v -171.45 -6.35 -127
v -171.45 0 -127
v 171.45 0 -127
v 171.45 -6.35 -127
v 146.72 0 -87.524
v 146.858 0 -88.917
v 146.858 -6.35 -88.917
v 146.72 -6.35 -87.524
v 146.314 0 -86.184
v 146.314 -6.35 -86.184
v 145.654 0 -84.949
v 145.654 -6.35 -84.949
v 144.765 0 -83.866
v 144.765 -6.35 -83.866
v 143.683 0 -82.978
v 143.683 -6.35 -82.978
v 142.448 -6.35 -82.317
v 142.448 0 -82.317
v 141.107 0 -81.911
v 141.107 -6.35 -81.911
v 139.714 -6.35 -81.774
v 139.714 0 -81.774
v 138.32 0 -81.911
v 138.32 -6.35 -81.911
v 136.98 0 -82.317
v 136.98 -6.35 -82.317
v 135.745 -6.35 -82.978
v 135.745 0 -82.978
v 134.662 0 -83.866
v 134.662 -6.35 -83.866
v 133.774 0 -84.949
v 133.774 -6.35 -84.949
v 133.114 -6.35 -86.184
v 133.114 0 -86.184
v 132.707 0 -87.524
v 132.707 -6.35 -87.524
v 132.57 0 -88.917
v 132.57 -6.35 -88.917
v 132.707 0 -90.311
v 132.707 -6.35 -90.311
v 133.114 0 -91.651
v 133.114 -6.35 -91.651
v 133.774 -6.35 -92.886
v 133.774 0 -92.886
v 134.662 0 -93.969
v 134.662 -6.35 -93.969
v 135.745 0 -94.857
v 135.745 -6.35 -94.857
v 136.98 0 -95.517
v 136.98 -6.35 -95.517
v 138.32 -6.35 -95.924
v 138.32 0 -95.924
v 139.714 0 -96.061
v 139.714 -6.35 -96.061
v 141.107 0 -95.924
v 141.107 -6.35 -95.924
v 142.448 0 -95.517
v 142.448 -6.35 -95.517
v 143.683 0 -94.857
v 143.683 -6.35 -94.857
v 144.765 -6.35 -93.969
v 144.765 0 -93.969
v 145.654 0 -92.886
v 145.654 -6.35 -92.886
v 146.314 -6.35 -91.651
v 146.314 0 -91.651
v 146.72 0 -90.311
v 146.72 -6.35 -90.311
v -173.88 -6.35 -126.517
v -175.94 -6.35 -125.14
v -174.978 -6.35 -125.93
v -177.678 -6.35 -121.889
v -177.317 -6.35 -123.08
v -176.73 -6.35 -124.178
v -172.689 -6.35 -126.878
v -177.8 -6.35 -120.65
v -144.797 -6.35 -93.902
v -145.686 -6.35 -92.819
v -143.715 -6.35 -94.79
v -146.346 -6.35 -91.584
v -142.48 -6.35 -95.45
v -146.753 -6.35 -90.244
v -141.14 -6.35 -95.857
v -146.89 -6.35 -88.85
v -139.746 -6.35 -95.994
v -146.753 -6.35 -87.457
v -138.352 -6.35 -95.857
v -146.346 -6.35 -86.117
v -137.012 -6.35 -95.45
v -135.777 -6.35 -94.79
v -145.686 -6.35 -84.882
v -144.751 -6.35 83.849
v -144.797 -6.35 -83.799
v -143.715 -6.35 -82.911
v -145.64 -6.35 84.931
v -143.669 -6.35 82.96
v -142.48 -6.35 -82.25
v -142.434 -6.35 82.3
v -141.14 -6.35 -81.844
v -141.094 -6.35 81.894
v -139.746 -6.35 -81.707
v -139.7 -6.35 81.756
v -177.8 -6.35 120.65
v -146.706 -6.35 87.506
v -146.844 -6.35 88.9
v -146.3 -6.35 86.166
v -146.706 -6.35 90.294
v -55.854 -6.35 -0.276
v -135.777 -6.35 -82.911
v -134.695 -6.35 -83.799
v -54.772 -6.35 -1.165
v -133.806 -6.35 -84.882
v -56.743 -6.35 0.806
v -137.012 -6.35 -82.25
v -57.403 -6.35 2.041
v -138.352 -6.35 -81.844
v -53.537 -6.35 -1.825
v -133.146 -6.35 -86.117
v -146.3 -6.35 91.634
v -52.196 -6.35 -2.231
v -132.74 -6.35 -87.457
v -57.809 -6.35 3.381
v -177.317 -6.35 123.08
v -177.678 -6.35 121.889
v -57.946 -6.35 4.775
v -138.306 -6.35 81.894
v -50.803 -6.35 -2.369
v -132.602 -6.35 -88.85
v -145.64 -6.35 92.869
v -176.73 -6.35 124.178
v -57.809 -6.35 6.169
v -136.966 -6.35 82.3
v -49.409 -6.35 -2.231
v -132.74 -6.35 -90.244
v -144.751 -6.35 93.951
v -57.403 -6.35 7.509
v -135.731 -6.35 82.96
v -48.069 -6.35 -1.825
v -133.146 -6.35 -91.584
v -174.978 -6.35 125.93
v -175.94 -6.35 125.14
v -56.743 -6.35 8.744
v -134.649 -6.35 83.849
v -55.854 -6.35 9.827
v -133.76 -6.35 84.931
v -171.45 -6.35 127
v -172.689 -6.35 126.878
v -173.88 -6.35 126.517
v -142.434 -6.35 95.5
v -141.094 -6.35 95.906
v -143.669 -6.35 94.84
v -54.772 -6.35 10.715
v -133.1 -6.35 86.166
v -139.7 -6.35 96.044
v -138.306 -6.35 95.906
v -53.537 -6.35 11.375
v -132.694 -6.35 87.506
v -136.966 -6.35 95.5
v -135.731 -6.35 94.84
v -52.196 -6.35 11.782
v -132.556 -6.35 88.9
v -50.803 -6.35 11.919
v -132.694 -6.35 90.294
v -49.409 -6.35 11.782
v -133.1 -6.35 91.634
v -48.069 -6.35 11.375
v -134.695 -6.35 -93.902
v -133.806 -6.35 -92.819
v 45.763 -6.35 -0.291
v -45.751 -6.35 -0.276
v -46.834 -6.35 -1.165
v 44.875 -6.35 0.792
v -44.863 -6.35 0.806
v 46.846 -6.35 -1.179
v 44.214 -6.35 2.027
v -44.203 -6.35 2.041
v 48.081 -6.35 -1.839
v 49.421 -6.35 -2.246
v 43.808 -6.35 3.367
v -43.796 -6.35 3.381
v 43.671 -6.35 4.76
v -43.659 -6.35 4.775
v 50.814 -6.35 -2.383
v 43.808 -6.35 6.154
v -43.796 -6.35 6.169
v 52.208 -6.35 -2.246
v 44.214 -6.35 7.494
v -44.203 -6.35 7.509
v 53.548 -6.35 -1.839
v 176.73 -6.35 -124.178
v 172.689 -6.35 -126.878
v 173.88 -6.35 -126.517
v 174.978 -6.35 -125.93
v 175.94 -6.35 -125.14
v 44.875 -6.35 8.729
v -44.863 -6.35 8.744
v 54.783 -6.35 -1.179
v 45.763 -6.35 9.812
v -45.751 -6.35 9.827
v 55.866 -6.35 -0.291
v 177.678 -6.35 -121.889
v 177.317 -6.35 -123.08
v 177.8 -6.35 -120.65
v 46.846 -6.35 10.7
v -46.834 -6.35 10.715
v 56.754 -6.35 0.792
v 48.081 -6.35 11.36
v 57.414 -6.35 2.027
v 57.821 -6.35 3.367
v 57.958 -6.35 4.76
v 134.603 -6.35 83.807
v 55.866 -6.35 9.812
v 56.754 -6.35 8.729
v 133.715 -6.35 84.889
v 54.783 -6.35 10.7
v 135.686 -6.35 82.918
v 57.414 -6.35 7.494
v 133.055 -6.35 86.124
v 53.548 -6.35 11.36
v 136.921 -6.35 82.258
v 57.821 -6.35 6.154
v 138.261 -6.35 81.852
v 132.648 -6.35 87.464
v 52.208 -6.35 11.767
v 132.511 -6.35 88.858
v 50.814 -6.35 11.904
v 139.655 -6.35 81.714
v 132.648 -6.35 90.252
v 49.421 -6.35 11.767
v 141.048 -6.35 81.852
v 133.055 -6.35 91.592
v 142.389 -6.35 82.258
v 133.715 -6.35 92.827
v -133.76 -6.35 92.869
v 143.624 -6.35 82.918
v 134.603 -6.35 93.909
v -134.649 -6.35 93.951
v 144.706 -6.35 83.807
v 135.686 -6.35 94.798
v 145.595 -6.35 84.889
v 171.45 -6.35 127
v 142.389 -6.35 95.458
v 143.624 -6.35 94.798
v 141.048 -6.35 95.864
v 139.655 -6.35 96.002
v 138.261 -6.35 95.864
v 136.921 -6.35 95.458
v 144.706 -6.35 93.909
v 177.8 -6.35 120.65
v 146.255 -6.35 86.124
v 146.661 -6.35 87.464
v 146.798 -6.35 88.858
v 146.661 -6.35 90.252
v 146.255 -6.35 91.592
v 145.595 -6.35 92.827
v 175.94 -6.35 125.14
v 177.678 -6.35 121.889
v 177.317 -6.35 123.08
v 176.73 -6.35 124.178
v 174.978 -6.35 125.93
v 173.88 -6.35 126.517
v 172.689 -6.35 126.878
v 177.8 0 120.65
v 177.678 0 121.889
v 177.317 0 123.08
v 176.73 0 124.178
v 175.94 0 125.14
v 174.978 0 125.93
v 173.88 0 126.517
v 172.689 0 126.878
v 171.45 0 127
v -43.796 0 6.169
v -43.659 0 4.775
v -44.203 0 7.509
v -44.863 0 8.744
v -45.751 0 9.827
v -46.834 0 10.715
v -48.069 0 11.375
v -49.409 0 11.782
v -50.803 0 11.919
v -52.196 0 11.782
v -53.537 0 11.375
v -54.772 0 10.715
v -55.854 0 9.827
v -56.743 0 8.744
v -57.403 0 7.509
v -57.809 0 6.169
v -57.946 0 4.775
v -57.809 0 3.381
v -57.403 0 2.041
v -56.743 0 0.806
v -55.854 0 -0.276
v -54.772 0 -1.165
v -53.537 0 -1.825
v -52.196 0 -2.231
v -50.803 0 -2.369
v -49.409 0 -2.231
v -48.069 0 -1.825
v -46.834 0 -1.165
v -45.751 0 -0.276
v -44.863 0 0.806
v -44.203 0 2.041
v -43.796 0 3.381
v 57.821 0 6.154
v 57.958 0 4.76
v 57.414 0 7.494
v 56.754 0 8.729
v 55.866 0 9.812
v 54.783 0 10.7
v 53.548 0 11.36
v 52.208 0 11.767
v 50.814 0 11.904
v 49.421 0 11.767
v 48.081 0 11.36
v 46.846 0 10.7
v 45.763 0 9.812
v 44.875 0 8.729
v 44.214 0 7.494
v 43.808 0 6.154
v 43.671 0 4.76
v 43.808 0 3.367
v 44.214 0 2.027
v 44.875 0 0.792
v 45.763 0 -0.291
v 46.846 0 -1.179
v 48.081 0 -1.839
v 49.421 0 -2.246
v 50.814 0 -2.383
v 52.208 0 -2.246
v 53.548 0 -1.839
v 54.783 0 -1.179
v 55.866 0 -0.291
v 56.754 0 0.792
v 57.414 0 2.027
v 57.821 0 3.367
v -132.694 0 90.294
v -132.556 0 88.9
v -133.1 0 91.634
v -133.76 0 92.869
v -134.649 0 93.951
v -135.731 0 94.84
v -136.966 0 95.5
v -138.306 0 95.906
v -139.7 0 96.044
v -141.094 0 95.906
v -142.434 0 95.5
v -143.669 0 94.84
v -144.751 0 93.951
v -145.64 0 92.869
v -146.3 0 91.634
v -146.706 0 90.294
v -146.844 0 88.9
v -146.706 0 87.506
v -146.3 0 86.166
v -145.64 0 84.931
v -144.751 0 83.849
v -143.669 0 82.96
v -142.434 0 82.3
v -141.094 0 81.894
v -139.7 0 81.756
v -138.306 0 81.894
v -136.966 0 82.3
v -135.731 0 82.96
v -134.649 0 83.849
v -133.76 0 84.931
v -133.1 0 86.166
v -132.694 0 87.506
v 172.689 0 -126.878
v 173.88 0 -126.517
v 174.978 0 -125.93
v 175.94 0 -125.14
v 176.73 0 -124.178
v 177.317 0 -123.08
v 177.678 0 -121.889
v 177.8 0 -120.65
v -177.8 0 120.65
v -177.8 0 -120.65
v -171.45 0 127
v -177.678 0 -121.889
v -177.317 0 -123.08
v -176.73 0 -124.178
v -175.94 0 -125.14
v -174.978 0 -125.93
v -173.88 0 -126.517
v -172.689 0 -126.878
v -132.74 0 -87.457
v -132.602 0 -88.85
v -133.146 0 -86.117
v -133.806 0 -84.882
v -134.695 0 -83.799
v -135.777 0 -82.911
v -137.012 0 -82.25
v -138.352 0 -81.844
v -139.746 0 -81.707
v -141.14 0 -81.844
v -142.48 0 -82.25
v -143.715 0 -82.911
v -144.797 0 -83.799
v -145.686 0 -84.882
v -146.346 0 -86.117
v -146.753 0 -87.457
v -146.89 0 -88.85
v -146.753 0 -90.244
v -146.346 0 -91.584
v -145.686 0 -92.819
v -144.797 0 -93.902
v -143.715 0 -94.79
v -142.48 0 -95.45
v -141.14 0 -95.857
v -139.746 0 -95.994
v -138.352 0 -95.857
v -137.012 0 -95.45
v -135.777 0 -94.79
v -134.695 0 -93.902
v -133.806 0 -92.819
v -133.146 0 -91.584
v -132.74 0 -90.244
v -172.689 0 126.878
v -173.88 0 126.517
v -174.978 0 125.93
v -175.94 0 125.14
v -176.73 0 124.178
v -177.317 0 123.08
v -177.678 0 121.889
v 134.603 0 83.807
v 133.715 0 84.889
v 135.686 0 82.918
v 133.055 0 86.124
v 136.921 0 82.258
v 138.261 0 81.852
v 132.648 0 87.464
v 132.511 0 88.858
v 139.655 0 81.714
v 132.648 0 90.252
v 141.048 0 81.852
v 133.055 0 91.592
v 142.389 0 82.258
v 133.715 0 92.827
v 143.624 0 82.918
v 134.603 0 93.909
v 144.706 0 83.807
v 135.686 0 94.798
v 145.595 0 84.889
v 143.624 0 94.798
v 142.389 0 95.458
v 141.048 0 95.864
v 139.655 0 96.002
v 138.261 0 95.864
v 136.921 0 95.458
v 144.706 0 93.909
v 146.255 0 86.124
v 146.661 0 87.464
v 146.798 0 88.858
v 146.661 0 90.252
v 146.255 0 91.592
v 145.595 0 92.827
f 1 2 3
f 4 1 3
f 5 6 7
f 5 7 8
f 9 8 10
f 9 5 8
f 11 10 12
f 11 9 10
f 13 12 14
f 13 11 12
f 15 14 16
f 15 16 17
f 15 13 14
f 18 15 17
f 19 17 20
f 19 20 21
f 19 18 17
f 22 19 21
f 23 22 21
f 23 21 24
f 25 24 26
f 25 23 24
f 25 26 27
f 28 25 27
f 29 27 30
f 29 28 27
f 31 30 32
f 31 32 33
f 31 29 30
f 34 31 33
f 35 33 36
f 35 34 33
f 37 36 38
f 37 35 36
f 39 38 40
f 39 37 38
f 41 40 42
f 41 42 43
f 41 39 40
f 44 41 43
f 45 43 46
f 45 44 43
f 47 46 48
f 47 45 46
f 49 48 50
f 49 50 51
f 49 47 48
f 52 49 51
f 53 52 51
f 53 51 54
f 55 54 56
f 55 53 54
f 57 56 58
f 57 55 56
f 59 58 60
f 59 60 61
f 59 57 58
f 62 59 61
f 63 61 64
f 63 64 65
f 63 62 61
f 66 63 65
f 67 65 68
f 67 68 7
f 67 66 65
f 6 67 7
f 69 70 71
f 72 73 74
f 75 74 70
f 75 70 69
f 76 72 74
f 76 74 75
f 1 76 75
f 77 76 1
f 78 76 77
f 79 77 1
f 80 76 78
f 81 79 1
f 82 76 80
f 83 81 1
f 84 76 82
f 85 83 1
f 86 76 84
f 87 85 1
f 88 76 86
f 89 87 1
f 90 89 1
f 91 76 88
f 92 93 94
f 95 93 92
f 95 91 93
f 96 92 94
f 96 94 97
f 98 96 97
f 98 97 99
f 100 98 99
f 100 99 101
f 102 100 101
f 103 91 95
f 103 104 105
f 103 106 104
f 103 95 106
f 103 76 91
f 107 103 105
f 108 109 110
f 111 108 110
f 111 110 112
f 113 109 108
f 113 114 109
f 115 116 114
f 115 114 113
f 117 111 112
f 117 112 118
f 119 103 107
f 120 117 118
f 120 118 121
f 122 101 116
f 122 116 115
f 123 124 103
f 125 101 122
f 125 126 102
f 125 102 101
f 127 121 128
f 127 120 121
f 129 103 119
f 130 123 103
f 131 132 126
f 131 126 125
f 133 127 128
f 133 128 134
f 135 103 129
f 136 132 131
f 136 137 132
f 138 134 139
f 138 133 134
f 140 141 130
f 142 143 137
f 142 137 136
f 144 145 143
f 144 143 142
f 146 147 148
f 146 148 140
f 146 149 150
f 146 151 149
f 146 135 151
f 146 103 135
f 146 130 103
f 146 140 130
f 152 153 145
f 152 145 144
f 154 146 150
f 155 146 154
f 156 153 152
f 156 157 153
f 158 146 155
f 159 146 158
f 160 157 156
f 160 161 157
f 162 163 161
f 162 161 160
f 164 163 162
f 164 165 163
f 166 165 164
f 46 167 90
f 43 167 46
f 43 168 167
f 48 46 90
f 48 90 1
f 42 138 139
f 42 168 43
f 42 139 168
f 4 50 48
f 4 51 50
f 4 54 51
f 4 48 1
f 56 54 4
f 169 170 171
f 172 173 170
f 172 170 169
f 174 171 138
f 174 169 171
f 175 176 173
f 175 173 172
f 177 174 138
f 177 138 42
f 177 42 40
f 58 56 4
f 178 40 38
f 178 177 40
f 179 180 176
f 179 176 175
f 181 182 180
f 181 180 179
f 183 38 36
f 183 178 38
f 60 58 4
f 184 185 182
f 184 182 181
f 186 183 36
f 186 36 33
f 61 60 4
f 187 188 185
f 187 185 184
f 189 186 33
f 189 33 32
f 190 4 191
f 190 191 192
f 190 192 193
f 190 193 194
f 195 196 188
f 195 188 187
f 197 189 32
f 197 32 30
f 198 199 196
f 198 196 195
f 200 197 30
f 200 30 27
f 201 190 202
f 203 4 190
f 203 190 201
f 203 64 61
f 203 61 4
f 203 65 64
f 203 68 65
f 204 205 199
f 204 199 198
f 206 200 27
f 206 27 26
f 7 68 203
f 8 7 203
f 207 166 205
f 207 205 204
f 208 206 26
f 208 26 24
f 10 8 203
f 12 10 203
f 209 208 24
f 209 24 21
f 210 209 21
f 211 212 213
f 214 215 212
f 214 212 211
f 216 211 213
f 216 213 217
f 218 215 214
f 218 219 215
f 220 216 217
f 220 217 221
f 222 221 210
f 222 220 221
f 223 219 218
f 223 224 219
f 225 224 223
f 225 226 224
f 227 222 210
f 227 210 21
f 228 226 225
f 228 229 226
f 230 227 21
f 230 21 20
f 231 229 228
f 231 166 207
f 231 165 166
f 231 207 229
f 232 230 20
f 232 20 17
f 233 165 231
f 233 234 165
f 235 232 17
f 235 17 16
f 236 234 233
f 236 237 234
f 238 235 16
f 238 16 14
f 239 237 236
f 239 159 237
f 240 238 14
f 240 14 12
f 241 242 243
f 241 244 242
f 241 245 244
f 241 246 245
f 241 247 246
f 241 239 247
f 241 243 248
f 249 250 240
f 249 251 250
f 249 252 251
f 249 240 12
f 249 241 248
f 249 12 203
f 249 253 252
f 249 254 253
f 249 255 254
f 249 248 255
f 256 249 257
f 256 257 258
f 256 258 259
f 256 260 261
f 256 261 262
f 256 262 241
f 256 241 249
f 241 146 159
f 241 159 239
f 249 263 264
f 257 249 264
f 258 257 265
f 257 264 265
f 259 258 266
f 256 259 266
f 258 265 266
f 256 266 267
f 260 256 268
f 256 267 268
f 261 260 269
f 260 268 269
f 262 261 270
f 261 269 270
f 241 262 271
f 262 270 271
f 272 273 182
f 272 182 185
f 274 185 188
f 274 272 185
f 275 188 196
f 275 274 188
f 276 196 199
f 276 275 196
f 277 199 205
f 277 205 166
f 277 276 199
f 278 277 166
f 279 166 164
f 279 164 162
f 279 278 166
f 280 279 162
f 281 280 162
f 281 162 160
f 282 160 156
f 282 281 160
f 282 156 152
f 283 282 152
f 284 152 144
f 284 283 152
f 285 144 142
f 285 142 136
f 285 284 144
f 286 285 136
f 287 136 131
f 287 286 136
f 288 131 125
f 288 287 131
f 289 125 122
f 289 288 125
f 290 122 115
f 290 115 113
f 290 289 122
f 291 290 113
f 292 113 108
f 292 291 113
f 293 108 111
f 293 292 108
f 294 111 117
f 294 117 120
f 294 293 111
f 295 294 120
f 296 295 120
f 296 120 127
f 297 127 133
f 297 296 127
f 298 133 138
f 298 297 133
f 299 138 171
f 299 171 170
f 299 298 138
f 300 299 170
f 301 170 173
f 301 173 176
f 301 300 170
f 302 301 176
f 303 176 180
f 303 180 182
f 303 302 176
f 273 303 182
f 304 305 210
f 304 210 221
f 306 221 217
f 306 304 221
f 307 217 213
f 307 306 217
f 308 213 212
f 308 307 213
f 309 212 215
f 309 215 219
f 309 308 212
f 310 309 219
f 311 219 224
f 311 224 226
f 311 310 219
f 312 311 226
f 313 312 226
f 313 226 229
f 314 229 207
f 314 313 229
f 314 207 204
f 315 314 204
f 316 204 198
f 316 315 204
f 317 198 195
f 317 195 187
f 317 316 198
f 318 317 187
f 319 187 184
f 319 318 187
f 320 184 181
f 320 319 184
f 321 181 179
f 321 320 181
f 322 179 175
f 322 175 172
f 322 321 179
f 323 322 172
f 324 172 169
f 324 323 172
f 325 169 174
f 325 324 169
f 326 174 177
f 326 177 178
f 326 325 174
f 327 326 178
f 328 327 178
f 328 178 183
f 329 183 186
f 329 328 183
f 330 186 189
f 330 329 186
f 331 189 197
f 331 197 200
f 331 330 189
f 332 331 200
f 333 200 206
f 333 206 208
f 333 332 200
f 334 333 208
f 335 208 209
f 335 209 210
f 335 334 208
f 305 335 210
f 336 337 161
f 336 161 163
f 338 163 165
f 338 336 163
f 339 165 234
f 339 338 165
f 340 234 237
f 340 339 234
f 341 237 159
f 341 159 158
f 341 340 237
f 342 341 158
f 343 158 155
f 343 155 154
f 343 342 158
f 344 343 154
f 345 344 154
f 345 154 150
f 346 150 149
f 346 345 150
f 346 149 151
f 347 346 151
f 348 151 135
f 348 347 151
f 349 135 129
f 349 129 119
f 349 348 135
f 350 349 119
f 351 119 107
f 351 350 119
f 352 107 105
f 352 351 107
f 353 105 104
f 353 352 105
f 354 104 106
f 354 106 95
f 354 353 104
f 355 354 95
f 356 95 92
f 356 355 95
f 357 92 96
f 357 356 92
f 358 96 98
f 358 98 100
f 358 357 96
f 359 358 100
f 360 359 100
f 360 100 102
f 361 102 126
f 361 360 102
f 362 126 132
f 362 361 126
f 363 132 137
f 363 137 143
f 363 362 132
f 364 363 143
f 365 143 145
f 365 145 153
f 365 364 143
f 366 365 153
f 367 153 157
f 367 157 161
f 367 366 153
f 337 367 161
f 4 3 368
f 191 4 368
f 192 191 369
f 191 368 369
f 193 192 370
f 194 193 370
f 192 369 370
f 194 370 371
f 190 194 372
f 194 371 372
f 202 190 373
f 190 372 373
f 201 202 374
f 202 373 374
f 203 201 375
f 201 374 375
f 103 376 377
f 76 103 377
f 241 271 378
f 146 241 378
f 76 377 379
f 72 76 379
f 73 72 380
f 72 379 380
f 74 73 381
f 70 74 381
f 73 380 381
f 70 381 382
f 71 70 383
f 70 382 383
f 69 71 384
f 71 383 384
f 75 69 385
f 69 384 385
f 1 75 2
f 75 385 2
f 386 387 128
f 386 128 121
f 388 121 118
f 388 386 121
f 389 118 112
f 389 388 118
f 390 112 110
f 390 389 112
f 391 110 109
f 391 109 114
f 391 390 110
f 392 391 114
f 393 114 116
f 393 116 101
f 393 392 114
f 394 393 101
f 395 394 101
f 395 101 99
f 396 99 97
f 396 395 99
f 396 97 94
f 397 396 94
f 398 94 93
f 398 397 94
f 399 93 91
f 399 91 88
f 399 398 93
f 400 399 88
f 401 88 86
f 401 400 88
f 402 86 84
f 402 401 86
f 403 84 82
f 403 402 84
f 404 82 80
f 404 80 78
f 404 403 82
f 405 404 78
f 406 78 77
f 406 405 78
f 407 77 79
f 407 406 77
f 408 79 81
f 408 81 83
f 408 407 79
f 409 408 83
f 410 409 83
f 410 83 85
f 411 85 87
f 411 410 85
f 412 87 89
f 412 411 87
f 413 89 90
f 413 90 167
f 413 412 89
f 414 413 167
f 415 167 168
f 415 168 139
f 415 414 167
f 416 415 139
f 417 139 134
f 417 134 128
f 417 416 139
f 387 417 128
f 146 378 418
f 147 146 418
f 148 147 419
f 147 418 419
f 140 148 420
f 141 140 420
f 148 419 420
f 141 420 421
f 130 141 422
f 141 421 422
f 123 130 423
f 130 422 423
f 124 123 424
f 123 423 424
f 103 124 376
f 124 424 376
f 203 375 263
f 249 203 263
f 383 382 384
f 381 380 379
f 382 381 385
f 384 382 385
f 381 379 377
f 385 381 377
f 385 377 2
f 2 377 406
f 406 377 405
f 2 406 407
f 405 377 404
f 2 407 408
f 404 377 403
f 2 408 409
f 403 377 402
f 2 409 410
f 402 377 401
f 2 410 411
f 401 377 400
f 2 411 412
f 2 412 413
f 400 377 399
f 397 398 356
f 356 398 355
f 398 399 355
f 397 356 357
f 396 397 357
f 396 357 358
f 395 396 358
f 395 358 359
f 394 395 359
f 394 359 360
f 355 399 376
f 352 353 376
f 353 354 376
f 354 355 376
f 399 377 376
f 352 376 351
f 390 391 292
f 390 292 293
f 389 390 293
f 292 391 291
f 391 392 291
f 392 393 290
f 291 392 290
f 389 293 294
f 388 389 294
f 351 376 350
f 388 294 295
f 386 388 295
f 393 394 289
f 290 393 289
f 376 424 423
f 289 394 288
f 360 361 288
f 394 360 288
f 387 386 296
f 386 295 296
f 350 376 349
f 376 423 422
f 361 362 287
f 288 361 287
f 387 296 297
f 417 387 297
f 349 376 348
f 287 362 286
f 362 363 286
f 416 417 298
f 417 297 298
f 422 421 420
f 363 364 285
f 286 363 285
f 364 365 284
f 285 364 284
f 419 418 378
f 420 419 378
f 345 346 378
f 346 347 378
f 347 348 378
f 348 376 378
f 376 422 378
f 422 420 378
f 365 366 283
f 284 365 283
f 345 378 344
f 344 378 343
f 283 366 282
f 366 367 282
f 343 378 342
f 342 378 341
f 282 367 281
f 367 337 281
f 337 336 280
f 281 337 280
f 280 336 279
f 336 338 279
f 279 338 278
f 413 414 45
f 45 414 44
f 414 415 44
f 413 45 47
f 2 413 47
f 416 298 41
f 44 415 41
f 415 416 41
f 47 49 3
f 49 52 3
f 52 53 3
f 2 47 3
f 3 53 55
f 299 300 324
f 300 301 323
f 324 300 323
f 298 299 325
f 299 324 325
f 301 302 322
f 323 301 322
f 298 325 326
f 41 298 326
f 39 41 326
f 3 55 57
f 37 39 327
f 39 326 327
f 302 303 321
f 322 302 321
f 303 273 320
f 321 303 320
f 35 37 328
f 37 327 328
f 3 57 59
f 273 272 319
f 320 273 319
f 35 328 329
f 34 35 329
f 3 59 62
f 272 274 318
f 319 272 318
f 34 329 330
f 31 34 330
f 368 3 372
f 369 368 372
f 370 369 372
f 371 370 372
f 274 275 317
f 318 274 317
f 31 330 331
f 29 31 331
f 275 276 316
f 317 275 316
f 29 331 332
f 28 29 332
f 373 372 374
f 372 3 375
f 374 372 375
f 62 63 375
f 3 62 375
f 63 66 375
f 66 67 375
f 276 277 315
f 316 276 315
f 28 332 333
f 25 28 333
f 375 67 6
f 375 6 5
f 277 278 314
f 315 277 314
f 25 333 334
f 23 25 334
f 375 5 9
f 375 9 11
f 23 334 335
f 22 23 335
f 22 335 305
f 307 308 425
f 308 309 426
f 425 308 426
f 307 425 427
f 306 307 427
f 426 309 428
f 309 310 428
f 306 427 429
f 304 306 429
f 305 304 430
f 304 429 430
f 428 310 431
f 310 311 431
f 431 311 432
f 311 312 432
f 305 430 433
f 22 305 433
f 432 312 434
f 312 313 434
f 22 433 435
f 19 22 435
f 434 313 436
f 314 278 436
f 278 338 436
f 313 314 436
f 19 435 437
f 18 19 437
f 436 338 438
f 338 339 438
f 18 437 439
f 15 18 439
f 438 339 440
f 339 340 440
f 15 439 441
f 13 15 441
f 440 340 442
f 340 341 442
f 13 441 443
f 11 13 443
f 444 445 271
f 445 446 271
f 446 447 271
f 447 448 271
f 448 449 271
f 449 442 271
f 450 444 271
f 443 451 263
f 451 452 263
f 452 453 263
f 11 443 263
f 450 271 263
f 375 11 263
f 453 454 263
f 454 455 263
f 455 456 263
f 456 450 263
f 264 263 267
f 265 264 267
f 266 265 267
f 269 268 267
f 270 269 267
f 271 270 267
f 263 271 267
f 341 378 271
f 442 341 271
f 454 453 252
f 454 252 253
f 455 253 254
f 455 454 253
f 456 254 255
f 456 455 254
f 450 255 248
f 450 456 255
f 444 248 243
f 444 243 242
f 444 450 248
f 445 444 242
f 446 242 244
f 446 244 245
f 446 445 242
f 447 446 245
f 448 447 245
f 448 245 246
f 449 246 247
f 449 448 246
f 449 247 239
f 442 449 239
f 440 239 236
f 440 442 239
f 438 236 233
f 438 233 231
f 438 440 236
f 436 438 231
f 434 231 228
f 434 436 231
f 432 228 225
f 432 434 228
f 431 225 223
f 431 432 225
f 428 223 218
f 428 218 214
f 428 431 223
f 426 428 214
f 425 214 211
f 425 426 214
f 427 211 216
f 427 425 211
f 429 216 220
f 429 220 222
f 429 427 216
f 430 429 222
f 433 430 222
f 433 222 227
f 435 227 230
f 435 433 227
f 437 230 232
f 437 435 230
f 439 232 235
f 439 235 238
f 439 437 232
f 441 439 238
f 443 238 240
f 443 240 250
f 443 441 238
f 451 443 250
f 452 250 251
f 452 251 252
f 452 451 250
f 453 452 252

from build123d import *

# Parameters (mm, degrees)
F0_R     = 7.14375
F1_DEPTH = 6.35


with BuildPart() as f1:
    # F0 (on Front) → F1 (new body)
    with BuildSketch(Plane.XZ):
        with BuildLine():
            ThreePointArc((-171.45, 127), (-175.940128, 125.140128), (-177.8, 120.65))
            Line((-177.8, 120.65), (-177.8, -20.6375))
            Line((-177.8, -20.6375), (-177.8, -30.1625))
            Line((-177.8, -30.1625), (-177.8, -120.65))
            ThreePointArc((-177.8, -120.65), (-175.940128, -125.140128), (-171.45, -127))
            Line((-171.45, -127), (171.45, -127))
            ThreePointArc((171.45, -127), (175.940128, -125.140128), (177.8, -120.65))
            Line((177.8, -120.65), (177.8, -30.1625))
            Line((177.8, -30.1625), (177.8, -20.6375))
            Line((177.8, -20.6375), (177.8, 120.65))
            ThreePointArc((177.8, 120.65), (175.940128, 125.140128), (171.45, 127))
            Line((171.45, 127), (-171.45, 127))
        make_face()
        with Locations((-139.746101, -88.850368)):
            Circle(F0_R, mode=Mode.SUBTRACT)
        with Locations((139.713767, -88.917399)):
            Circle(F0_R, mode=Mode.SUBTRACT)
        with Locations((-50.802743, 4.775175)):
            Circle(F0_R, mode=Mode.SUBTRACT)
        with Locations((-139.7, 88.9)):
            Circle(F0_R, mode=Mode.SUBTRACT)
        with Locations((50.814427, 4.760493)):
            Circle(F0_R, mode=Mode.SUBTRACT)
        with Locations((139.654712, 88.858014)):
            Circle(F0_R, mode=Mode.SUBTRACT)
    extrude(amount=F1_DEPTH)


solid = f1.part
